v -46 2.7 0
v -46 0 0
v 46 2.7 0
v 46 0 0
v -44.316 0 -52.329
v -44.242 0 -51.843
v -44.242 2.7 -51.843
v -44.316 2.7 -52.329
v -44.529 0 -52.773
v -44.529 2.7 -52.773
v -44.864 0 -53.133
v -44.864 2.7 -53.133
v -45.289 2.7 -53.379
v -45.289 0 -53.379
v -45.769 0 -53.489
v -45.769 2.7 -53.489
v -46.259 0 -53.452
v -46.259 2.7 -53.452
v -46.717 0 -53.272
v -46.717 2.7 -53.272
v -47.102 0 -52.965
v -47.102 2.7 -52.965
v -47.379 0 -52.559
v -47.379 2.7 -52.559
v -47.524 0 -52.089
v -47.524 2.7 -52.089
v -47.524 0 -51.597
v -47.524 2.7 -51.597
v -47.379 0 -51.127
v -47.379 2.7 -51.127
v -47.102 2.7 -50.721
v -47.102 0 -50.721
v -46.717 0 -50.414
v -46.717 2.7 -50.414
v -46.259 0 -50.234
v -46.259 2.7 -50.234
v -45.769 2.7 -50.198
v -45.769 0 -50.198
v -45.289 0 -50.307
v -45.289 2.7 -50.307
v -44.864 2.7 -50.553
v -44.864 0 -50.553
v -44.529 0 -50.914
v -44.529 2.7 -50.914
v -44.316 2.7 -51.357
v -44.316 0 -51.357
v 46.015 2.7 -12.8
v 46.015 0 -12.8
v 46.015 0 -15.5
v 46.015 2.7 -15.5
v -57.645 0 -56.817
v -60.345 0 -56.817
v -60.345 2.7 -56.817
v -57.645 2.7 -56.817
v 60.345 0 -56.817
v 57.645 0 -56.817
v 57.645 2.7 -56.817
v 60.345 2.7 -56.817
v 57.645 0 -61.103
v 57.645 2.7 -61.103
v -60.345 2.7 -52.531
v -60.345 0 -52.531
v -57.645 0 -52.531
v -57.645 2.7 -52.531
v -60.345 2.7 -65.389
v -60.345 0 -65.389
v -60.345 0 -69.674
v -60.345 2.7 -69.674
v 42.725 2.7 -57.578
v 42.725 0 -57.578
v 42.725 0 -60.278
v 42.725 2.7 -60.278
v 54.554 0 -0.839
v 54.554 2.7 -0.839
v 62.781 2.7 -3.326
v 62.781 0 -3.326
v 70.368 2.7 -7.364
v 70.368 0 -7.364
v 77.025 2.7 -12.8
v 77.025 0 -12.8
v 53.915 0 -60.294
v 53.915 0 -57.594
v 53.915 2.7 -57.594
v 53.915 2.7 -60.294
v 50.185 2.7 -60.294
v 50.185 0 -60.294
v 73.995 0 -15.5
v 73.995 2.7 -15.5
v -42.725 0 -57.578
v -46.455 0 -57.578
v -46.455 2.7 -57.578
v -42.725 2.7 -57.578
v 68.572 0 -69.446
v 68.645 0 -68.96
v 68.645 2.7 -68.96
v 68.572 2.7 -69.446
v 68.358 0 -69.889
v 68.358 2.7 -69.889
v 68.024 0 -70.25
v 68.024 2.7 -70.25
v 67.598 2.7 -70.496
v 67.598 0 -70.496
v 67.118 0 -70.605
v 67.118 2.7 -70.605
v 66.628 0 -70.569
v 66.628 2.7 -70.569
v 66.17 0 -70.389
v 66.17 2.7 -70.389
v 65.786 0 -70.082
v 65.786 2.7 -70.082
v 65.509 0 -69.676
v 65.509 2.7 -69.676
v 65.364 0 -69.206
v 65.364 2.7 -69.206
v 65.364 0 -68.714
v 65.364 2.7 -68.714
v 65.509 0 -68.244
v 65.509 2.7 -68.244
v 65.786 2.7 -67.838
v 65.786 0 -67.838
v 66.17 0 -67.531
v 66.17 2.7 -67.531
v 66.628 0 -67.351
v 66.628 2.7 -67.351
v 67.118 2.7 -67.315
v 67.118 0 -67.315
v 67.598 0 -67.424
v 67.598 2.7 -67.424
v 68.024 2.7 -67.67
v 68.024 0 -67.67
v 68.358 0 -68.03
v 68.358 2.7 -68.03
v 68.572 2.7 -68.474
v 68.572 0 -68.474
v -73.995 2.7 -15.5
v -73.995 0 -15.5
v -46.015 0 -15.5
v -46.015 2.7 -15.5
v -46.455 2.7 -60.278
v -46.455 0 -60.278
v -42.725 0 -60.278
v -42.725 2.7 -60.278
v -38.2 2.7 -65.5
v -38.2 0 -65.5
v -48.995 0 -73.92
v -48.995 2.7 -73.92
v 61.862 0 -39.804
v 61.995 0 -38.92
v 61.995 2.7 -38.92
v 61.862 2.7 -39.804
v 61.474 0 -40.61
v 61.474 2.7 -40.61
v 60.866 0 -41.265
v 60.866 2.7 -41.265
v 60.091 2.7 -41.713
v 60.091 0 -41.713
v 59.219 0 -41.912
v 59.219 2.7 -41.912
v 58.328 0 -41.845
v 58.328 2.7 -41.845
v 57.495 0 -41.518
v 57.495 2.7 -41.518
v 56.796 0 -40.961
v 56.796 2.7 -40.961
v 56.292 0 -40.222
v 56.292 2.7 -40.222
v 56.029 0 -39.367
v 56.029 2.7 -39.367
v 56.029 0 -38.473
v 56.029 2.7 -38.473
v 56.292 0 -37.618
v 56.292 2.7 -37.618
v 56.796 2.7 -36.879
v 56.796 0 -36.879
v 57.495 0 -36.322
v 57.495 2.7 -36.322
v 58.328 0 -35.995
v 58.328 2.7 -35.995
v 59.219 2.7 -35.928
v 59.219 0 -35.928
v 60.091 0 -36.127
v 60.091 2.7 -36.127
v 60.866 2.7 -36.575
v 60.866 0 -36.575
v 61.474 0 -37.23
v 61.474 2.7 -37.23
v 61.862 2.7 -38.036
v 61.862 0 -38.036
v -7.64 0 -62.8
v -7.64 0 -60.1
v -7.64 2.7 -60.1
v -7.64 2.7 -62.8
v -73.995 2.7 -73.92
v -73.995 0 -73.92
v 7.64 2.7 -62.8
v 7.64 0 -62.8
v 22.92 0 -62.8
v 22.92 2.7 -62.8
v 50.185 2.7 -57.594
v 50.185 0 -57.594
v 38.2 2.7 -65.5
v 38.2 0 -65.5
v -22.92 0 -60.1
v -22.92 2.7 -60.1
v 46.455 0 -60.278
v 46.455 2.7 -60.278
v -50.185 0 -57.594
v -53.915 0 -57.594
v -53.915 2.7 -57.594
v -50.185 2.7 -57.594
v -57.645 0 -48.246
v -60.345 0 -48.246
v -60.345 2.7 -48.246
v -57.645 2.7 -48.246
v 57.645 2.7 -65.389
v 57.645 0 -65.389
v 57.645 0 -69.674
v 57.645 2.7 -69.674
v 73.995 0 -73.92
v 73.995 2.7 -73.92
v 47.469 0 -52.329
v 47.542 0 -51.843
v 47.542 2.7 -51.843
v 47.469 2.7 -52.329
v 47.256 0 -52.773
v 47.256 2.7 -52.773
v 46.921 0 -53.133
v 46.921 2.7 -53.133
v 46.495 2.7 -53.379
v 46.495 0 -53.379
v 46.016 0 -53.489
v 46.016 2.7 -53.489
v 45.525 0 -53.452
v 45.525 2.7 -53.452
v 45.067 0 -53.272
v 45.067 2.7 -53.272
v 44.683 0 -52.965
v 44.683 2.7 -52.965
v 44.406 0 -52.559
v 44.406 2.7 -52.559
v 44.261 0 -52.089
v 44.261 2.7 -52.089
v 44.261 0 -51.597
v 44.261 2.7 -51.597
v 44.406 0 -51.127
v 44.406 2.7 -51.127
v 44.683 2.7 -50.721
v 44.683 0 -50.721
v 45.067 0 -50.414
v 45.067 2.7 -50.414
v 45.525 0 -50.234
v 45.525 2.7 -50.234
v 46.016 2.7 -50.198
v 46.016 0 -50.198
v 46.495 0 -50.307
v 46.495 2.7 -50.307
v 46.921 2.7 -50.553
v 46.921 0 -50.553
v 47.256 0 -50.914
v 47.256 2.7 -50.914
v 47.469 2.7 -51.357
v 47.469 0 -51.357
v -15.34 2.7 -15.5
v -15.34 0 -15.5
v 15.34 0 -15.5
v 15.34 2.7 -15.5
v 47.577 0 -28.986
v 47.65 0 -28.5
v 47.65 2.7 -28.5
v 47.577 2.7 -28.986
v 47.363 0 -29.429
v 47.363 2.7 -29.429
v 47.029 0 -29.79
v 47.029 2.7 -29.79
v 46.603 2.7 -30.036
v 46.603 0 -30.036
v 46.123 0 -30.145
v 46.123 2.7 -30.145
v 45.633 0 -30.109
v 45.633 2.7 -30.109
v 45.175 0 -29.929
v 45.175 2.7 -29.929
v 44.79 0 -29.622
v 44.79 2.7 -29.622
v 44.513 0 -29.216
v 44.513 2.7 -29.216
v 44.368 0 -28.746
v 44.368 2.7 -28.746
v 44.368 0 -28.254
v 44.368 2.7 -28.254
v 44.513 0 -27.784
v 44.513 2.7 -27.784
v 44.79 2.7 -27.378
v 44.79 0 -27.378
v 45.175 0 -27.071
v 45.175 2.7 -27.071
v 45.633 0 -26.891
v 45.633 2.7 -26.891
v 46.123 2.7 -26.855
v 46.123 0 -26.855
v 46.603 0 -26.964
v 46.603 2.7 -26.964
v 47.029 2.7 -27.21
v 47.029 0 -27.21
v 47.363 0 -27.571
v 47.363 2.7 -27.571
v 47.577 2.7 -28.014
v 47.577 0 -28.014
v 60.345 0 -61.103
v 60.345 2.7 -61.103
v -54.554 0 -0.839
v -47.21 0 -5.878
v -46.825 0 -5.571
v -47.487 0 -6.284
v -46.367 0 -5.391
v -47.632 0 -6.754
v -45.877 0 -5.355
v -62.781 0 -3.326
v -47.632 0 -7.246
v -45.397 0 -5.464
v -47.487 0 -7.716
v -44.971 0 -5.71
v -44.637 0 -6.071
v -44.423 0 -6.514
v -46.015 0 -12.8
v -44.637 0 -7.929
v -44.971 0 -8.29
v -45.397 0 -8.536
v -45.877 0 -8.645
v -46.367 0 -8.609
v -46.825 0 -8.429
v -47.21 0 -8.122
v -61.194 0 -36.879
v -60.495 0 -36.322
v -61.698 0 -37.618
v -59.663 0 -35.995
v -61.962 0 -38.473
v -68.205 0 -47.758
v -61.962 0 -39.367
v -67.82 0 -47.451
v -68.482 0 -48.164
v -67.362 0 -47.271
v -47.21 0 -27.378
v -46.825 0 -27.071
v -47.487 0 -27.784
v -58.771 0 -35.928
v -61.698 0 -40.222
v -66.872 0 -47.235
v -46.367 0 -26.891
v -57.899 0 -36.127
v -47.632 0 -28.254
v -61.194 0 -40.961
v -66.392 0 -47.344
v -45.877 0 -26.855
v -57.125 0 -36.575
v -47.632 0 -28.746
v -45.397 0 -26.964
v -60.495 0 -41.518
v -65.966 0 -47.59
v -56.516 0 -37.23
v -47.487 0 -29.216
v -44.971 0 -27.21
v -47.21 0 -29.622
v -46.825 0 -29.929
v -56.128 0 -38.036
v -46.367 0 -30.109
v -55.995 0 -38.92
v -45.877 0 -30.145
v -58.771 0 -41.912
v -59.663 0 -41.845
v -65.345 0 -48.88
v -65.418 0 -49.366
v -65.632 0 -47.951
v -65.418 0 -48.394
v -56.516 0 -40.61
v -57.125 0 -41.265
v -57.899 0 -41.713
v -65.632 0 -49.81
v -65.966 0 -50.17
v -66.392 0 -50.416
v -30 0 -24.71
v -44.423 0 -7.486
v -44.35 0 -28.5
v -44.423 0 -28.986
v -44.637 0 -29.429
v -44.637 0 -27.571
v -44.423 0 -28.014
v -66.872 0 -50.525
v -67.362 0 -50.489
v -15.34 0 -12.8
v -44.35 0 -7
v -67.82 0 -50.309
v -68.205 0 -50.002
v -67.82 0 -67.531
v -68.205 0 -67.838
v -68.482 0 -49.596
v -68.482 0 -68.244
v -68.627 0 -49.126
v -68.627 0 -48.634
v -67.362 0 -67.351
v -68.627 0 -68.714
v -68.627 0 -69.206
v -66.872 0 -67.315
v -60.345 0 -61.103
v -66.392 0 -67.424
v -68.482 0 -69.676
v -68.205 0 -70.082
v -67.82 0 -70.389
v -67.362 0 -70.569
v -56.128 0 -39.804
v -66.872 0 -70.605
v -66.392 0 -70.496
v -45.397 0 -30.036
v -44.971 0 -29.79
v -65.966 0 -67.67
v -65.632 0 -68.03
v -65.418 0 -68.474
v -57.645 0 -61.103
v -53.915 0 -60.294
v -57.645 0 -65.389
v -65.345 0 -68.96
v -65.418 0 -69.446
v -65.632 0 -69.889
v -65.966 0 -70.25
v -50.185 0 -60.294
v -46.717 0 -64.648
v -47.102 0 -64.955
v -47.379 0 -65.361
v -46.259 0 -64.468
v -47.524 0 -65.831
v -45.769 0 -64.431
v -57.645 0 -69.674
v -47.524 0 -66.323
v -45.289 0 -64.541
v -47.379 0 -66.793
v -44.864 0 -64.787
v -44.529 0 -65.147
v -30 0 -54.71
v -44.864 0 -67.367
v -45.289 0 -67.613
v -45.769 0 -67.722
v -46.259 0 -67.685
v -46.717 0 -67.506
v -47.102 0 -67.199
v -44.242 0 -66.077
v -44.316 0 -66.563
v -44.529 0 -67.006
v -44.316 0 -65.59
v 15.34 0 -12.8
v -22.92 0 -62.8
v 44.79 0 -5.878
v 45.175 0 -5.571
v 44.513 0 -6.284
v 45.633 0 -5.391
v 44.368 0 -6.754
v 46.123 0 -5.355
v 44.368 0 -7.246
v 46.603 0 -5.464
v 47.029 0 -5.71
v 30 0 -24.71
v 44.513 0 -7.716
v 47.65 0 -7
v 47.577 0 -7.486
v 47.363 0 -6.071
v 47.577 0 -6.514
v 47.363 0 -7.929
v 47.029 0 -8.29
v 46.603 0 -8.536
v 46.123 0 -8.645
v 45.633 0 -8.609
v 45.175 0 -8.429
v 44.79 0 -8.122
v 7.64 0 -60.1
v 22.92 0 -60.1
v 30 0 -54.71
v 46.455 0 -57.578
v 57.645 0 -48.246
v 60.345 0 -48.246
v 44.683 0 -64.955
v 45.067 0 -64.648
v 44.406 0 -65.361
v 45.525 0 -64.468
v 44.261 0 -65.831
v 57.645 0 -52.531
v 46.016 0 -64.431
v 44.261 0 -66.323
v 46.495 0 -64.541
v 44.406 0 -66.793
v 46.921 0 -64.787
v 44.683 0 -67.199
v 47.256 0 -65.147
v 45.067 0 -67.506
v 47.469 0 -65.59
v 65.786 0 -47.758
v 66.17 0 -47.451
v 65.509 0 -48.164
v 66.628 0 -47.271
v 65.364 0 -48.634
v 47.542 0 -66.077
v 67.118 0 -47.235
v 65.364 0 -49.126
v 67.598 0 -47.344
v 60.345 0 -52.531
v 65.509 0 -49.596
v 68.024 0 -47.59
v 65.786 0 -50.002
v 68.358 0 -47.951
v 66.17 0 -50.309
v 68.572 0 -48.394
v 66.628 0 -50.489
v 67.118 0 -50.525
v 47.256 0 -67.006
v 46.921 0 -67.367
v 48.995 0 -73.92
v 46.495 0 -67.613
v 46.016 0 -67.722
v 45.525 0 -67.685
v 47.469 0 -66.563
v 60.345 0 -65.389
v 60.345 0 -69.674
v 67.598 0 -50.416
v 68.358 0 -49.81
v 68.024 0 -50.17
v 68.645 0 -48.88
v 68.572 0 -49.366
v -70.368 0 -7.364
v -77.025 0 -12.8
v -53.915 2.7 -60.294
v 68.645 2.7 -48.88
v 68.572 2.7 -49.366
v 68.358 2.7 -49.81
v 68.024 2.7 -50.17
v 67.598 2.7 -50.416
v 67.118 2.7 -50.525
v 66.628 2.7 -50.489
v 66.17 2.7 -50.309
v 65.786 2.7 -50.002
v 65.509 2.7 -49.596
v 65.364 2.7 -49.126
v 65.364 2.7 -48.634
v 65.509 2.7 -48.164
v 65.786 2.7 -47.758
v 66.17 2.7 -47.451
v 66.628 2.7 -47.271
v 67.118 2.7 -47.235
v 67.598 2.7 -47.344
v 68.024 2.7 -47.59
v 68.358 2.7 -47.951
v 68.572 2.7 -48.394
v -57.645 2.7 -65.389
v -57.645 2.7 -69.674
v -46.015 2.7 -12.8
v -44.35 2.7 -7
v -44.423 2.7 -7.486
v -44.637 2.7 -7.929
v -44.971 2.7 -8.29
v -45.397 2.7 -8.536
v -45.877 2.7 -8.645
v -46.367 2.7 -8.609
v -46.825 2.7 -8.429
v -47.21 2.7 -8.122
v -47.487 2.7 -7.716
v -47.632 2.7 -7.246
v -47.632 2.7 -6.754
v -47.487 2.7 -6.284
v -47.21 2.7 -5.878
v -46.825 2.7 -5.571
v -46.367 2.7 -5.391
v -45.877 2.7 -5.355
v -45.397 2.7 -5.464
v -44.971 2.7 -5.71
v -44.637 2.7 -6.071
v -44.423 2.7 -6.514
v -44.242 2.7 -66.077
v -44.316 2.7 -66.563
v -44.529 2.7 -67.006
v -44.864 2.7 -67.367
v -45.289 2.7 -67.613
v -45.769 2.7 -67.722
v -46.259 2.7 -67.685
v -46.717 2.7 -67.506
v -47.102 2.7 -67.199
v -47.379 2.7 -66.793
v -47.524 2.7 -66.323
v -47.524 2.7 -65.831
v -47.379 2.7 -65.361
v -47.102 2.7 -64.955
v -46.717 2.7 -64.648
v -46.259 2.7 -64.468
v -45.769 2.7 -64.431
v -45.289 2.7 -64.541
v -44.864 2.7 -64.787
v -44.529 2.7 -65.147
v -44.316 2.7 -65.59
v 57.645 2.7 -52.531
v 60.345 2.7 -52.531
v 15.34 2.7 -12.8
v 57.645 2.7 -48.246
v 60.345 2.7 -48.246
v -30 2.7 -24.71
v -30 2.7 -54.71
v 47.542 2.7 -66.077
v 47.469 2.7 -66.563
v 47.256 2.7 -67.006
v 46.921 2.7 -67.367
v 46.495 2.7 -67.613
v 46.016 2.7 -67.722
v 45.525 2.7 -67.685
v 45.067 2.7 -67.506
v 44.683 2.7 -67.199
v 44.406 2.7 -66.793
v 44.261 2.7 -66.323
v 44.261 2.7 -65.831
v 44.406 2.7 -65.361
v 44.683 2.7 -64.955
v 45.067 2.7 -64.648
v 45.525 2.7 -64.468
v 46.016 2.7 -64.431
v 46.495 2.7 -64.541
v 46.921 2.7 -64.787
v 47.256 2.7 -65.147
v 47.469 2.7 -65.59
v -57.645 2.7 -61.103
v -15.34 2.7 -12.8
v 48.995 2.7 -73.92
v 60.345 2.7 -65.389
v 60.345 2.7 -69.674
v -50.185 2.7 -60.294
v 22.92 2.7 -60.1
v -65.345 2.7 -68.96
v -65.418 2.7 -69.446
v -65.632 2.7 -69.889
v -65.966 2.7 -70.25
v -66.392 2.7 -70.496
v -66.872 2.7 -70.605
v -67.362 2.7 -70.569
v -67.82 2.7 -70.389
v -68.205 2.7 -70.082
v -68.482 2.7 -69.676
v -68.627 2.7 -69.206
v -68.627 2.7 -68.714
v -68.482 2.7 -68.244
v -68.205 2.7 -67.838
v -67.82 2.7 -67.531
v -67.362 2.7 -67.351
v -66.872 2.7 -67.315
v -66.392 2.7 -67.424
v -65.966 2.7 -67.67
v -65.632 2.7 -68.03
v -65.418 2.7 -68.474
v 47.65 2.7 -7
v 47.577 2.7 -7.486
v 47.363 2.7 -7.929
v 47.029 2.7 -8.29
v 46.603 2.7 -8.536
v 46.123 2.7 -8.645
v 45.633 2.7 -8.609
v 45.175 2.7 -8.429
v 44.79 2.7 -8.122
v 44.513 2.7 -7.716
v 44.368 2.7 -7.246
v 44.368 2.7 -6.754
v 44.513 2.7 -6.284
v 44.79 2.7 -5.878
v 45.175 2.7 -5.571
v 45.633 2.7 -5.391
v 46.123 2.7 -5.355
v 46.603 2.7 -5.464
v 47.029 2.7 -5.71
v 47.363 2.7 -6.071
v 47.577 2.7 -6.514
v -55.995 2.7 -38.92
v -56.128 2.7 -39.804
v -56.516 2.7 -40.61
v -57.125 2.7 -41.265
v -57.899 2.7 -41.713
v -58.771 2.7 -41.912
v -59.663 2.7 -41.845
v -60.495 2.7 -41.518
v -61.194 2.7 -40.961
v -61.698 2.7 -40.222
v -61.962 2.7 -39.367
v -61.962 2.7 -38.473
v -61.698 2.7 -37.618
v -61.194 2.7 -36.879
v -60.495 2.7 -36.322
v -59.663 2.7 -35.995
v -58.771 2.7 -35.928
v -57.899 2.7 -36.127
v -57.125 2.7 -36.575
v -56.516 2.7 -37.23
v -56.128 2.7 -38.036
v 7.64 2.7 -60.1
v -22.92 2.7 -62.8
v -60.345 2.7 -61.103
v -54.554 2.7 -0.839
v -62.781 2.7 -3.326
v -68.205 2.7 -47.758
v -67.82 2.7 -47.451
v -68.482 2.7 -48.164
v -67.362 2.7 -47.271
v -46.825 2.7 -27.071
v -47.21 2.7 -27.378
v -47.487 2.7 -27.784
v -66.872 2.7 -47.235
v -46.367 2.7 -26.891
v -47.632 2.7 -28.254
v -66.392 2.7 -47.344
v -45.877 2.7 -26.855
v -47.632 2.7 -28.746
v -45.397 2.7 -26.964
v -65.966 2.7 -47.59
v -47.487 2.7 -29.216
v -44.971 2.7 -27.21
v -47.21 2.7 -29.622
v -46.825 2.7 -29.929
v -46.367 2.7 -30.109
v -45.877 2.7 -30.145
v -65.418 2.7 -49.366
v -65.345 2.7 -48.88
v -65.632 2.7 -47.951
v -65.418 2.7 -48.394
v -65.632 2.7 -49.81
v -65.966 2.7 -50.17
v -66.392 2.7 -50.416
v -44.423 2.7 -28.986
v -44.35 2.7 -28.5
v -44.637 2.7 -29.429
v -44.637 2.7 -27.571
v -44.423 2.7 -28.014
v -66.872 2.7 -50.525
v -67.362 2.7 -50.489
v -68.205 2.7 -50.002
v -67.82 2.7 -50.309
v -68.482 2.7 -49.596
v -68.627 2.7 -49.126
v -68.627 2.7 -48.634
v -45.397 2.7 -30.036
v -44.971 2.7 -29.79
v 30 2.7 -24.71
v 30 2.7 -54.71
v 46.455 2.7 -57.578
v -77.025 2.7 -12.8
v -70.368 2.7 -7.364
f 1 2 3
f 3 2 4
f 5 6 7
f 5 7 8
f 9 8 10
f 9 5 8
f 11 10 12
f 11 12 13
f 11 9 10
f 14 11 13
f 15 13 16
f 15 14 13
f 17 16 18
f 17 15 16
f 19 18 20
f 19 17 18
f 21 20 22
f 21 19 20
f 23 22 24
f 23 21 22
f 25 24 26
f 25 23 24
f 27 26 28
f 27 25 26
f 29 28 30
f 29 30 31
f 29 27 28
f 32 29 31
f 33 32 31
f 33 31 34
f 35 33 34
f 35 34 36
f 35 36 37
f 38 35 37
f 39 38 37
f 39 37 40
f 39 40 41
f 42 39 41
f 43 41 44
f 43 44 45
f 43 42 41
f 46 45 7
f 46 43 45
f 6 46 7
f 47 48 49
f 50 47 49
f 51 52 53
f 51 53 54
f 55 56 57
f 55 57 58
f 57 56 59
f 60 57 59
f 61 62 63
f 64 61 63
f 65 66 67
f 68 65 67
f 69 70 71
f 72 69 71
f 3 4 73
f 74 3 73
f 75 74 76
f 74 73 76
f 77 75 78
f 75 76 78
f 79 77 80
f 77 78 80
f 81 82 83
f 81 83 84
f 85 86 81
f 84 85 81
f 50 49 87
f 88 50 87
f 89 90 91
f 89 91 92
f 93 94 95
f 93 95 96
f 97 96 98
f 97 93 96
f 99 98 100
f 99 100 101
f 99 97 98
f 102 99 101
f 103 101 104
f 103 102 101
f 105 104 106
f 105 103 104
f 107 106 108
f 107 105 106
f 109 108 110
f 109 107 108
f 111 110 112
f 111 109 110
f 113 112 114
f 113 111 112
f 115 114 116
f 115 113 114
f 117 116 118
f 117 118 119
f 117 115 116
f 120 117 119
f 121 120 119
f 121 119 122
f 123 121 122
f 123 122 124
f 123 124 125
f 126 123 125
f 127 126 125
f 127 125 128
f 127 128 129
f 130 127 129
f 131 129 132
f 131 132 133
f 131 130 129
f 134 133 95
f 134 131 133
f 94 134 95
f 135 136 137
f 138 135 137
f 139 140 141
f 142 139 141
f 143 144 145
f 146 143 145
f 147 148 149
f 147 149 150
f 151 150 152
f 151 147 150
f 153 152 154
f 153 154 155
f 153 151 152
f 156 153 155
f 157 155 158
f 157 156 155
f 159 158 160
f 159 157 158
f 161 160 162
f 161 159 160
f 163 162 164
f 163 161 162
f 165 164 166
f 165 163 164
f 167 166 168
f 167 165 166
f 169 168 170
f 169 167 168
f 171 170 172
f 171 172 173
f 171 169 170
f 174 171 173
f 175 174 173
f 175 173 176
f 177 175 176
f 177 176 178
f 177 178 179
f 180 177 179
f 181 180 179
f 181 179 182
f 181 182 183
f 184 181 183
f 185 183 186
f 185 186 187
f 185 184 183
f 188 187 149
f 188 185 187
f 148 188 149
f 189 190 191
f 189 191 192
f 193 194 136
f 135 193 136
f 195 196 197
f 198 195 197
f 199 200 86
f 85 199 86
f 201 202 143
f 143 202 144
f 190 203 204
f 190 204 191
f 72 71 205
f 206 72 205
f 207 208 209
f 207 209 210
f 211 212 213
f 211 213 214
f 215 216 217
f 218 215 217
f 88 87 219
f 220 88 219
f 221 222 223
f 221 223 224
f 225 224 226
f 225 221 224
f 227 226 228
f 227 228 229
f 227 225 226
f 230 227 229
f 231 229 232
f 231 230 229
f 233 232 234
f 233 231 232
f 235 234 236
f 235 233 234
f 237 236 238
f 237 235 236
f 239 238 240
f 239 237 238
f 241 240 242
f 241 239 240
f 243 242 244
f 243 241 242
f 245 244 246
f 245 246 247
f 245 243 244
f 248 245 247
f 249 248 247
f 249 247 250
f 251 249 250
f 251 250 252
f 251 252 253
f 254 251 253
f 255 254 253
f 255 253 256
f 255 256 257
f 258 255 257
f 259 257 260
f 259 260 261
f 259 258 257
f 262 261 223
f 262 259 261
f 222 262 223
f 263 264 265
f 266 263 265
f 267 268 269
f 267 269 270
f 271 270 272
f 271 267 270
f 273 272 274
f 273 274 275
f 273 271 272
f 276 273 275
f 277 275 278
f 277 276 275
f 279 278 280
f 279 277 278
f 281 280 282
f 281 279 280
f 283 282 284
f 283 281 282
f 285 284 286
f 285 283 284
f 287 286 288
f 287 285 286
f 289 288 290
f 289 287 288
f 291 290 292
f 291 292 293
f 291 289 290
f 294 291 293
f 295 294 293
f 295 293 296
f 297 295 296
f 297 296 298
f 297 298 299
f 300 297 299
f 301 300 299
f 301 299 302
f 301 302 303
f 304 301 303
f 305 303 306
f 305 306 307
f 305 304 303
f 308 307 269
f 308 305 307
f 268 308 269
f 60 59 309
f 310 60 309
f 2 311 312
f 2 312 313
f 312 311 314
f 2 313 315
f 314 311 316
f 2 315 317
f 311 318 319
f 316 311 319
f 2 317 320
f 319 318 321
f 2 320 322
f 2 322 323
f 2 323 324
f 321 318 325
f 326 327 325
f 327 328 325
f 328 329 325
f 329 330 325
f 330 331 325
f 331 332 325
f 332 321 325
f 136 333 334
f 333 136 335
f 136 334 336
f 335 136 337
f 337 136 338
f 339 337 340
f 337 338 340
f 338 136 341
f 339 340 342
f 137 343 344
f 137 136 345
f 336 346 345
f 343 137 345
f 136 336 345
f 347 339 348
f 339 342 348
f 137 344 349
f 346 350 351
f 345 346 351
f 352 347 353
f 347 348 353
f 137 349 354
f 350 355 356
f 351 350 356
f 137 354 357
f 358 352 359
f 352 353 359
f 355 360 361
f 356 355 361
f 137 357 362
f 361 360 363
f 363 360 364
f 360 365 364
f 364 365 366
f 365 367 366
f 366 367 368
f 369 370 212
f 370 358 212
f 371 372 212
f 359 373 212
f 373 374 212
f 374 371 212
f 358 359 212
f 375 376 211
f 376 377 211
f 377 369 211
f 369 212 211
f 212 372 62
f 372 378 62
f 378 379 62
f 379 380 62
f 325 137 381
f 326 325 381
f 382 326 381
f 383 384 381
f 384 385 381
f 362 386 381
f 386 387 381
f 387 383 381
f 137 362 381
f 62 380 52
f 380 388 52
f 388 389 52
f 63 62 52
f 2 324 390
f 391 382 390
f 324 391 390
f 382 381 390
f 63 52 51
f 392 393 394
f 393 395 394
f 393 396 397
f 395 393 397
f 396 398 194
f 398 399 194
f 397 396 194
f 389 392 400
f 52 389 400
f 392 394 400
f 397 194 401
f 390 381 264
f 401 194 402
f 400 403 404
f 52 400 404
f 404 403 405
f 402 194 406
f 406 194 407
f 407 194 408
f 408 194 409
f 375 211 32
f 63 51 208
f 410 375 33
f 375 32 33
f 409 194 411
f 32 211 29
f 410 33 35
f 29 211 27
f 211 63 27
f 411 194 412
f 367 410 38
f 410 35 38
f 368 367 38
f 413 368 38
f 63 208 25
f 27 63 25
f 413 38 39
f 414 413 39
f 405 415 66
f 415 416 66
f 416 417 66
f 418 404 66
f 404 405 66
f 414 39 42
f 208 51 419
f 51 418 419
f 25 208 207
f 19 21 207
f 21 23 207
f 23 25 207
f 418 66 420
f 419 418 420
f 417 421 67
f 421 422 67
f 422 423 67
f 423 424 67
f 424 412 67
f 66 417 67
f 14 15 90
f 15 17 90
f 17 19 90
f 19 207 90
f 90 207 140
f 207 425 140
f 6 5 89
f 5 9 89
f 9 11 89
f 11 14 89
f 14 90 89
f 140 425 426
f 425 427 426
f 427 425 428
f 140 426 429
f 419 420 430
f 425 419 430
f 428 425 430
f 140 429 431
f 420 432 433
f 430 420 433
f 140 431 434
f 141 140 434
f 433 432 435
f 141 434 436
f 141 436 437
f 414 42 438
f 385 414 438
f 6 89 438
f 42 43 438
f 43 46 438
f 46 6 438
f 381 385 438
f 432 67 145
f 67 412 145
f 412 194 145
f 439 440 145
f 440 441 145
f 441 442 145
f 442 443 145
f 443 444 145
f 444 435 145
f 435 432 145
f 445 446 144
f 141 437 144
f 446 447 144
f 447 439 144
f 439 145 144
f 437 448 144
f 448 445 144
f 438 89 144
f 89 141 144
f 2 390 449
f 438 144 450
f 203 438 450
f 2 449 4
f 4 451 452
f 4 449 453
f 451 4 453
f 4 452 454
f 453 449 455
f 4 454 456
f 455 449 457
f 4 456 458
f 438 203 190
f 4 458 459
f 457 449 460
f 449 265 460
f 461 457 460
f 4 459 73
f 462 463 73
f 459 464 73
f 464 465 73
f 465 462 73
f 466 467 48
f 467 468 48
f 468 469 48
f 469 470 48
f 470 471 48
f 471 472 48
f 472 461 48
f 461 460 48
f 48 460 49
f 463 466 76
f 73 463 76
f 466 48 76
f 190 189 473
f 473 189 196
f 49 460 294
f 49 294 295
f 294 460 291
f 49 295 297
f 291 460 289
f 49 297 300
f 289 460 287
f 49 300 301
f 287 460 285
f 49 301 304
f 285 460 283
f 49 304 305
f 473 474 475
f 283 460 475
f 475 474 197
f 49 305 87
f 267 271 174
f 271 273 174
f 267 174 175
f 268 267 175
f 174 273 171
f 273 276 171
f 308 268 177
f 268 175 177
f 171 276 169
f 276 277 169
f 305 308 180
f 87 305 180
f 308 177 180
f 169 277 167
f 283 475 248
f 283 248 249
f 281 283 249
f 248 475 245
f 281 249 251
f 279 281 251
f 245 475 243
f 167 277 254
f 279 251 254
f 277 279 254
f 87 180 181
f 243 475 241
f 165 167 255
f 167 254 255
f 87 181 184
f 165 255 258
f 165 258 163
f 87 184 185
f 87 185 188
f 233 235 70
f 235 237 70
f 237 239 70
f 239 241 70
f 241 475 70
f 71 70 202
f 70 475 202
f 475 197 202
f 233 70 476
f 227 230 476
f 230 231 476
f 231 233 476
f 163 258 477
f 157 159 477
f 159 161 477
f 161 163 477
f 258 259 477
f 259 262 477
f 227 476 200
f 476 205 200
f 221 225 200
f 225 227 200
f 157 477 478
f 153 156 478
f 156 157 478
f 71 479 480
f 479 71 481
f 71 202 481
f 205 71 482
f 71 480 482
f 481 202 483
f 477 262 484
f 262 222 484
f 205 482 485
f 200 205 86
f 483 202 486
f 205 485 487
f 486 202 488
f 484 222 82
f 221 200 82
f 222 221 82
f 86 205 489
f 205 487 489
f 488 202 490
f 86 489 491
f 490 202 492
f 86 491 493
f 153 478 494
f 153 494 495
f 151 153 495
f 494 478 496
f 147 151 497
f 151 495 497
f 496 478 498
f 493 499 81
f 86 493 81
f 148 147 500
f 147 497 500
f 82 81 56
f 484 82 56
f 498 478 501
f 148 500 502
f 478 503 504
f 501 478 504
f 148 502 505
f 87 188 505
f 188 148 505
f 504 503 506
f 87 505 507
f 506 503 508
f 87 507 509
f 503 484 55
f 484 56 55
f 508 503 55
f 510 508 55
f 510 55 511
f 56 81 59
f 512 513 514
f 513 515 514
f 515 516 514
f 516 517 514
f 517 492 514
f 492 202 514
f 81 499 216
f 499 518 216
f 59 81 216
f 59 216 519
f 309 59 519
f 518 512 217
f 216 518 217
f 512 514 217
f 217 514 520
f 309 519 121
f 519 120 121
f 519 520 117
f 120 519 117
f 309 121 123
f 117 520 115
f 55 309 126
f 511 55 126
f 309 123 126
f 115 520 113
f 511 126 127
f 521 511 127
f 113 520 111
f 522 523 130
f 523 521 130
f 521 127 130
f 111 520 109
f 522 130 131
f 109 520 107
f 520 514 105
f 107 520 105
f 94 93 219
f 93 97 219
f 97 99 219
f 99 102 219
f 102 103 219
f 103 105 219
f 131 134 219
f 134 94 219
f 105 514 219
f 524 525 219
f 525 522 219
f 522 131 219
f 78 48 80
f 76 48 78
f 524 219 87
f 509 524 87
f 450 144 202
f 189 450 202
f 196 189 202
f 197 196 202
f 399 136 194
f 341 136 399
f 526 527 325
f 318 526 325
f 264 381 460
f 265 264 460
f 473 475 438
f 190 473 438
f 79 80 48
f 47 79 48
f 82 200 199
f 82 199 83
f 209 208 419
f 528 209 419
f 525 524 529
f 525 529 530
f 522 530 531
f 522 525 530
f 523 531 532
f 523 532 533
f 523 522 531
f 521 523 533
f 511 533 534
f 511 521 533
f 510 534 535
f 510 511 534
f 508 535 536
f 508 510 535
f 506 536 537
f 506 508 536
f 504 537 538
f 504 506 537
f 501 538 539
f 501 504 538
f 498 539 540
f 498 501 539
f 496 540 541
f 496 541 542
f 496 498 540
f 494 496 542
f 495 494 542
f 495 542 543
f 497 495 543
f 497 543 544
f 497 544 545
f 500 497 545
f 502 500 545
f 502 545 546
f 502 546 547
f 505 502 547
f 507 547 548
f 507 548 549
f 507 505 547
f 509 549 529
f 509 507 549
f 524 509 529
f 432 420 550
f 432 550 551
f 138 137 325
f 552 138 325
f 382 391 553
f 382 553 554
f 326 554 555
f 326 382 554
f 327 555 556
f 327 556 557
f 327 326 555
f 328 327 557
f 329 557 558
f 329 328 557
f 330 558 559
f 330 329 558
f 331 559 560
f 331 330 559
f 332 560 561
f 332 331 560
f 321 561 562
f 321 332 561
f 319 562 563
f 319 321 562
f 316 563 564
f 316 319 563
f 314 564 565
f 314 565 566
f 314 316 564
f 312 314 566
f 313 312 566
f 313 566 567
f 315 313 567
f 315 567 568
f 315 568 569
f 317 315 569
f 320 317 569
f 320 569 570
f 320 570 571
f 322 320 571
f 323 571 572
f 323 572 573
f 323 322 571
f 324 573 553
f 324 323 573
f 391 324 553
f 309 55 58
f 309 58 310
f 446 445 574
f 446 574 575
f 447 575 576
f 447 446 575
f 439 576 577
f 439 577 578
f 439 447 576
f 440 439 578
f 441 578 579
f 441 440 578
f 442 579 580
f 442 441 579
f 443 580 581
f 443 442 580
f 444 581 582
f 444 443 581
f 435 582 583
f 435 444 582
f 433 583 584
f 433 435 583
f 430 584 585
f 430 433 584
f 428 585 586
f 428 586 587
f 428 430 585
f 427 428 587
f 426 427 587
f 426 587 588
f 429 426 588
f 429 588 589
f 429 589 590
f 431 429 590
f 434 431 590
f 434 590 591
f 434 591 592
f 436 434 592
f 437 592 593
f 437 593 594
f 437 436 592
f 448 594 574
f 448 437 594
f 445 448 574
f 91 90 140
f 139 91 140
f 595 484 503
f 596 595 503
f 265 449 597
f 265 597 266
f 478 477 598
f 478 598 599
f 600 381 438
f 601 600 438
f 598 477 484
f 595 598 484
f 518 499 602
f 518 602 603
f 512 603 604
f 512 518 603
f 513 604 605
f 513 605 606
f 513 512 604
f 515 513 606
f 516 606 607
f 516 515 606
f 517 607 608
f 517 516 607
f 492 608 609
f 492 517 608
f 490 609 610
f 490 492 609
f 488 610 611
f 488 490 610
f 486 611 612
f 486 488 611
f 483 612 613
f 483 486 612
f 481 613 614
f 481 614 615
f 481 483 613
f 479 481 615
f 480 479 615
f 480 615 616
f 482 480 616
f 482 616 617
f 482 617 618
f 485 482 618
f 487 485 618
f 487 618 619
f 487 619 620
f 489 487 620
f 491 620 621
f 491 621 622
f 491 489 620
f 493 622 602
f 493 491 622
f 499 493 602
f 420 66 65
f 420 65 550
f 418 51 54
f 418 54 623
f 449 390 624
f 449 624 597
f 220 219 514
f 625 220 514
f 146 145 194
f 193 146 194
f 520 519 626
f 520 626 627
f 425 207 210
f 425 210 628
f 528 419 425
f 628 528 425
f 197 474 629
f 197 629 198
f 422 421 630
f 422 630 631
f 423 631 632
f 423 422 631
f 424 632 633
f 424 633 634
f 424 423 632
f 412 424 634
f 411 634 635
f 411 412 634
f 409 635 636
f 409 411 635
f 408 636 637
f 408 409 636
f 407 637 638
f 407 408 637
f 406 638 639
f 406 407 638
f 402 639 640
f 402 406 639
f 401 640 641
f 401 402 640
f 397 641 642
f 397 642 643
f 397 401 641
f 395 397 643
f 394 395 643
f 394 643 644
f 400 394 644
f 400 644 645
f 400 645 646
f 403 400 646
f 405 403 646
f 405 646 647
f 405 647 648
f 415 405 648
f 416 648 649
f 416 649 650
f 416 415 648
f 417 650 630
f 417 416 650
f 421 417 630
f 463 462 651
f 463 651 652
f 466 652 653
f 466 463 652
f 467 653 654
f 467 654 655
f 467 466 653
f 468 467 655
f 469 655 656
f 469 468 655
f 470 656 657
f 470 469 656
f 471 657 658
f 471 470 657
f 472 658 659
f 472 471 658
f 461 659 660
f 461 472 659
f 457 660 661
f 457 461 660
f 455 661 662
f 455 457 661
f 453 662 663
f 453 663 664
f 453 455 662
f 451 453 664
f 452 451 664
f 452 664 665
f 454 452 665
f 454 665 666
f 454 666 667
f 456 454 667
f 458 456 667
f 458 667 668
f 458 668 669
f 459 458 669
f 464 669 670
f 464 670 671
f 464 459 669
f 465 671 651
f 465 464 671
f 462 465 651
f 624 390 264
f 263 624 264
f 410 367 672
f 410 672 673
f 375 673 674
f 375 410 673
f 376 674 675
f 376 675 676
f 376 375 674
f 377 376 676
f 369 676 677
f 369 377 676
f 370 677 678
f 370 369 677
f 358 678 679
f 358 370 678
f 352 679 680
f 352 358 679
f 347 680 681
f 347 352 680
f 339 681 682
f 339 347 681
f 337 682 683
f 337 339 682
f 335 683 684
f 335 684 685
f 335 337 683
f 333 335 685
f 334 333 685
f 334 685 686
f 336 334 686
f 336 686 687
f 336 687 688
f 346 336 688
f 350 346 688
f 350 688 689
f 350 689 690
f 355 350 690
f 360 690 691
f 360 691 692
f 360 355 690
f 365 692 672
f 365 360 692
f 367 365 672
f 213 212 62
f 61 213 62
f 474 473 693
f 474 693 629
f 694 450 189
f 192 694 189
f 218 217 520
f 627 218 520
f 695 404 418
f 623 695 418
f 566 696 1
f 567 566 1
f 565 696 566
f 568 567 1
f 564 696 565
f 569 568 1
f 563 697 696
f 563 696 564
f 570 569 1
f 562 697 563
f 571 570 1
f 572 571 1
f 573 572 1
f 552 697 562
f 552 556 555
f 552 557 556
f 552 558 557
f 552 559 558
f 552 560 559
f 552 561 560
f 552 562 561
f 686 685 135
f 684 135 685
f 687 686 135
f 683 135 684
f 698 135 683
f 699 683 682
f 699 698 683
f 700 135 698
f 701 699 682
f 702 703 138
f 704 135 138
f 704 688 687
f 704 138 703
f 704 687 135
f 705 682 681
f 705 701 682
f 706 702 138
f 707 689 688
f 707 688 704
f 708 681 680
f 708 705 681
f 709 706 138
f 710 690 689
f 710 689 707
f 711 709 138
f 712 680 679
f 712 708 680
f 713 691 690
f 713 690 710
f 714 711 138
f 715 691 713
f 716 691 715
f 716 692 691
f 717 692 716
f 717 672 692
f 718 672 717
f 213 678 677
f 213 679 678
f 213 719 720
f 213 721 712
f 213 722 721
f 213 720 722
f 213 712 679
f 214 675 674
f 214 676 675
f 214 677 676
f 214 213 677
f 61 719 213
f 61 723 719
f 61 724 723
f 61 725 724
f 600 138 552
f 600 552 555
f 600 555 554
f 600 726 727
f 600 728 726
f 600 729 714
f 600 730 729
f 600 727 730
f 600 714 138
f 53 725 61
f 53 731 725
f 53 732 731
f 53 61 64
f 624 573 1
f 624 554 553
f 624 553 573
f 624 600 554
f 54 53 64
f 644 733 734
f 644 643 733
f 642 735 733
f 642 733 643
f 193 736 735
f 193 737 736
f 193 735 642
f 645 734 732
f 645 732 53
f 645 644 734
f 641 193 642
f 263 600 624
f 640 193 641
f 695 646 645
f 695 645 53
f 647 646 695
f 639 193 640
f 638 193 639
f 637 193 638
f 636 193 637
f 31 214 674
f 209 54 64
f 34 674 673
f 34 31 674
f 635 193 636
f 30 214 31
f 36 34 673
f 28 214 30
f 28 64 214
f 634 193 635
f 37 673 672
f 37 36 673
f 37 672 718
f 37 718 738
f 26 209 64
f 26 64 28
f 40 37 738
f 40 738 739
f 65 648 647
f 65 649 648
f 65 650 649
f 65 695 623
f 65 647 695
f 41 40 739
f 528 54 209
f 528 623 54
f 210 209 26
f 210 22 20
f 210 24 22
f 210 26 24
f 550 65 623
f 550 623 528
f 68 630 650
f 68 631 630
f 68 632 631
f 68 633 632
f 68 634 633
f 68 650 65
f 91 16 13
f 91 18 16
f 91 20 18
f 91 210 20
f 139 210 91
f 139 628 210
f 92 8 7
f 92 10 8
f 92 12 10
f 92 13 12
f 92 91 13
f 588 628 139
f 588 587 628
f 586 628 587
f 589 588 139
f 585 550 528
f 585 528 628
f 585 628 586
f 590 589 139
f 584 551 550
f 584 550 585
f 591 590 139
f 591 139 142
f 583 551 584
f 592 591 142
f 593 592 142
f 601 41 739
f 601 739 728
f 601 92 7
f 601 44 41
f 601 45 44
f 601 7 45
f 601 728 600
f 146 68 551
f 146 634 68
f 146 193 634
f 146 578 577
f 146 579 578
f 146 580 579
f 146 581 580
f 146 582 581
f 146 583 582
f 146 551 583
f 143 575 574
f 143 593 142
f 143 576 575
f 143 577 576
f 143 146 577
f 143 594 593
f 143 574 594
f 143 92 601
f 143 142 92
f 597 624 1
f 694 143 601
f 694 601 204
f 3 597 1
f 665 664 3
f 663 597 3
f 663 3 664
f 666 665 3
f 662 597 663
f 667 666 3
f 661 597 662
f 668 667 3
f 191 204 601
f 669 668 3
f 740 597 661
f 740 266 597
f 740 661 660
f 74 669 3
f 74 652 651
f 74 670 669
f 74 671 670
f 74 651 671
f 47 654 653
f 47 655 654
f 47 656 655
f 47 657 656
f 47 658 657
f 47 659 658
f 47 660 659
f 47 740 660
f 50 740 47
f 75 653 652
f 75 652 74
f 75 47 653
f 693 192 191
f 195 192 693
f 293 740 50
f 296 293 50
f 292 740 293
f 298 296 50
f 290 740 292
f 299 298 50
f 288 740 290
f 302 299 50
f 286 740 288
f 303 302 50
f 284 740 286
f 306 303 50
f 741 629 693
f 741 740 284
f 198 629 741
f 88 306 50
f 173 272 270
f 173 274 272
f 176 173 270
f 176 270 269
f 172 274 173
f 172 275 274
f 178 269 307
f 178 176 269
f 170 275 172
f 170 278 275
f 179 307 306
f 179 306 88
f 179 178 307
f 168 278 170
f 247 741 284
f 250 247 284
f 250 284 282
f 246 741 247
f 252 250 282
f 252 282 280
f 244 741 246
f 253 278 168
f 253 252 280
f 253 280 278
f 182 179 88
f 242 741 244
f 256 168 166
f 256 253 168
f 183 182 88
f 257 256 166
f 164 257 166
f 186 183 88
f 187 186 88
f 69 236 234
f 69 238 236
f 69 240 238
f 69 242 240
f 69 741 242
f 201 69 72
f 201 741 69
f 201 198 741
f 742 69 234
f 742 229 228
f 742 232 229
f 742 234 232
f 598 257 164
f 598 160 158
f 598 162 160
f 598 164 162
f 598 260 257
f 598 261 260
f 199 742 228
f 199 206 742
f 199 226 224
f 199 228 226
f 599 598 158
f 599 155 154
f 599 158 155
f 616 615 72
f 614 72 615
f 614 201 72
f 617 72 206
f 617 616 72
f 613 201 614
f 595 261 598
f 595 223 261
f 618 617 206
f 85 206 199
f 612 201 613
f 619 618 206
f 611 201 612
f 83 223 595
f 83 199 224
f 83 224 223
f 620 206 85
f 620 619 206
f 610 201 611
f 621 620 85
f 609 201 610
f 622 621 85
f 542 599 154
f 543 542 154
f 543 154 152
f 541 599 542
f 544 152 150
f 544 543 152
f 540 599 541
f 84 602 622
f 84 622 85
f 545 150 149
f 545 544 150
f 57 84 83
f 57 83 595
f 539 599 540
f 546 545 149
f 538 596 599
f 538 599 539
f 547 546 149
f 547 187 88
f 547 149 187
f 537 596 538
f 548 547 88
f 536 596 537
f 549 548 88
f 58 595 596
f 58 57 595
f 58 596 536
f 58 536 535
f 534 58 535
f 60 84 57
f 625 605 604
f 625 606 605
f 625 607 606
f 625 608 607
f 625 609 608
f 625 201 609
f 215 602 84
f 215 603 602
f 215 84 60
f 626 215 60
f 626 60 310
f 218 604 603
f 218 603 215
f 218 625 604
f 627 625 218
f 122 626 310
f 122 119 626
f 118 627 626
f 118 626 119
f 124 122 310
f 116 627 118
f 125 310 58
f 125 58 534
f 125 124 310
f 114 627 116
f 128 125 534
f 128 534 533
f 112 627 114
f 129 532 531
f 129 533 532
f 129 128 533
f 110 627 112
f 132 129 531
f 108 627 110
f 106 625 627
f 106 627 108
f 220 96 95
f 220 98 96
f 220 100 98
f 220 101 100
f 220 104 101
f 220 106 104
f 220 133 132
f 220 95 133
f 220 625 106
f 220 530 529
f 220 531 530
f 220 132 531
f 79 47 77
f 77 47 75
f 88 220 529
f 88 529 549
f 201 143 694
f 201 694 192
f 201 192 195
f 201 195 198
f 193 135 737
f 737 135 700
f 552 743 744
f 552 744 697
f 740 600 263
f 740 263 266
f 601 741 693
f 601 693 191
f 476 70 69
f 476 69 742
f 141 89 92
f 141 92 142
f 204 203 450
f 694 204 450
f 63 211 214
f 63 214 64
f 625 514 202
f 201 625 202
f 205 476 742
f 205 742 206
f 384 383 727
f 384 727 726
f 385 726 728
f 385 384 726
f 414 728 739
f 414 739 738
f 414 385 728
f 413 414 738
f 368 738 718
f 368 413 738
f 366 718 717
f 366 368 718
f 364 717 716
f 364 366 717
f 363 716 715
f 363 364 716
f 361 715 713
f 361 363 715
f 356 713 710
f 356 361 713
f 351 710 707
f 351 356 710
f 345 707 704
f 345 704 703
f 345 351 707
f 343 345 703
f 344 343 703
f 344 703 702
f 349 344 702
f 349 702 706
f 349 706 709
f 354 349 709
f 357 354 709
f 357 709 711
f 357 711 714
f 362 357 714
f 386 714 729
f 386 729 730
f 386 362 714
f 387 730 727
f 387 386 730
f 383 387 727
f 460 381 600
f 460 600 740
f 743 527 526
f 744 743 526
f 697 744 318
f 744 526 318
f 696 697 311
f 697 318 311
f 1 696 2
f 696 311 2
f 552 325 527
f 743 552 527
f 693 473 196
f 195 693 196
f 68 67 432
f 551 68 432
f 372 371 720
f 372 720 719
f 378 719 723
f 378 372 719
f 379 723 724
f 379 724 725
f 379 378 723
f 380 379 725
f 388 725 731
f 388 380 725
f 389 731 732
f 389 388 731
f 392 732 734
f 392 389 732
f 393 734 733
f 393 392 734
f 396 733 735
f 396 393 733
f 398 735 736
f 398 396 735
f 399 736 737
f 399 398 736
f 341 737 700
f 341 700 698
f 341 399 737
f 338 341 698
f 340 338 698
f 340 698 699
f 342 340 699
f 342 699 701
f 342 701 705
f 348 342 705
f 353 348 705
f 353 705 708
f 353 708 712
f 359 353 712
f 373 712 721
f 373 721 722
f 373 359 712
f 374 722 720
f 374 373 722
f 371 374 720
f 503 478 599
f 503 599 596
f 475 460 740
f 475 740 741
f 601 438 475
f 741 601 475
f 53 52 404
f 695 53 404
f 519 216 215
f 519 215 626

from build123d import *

# Parameters (mm, degrees)
SKETCH1_R           = 1.65
SKETCH1_R_2         = 3
SKETCH1_W           = 30.68
SKETCH1_H           = 2.7
SKETCH1_W_2         = 15.28
SKETCH1_W_3         = 2.7
SKETCH1_H_2         = 4.285714286
SKETCH1_W_4         = 3.73
SKETCH1_W_5         = 60
SKETCH1_H_3         = 30
BOSS_EXTRUDE1_DEPTH = 2.7


with BuildPart() as part:
    # Sketch1 → Boss-Extrude1 (new body)
    with BuildSketch(Plane(origin=(0, 0, 0), x_dir=(1, 0, 0), z_dir=(0, 1, 0))):
        with BuildLine():
            Line((-46, 0), (46, 0))
            ThreePointArc((46, 0), (62.780941571, 3.32568378), (77.025151087, 12.8))
            Line((77.025151087, 12.8), (46.015151087, 12.8))
            Line((46.015151087, 12.8), (46.015151087, 15.5))
            Line((46.015151087, 15.5), (73.995151087, 15.5))
            Line((73.995151087, 15.5), (73.995151087, 35.5))
            Line((73.995151087, 35.5), (73.995151087, 43.92))
            Line((73.995151087, 43.92), (73.995151087, 73.92))
            Line((73.995151087, 73.92), (68.995151087, 73.92))
            Line((68.995151087, 73.92), (48.995151087, 73.92))
            Line((48.995151087, 73.92), (38.2, 65.5))
            Line((38.2, 65.5), (-38.2, 65.5))
            Line((-38.2, 65.5), (-48.995151087, 73.92))
            Line((-48.995151087, 73.92), (-68.995151087, 73.92))
            Line((-68.995151087, 73.92), (-73.995151087, 73.92))
            Line((-73.995151087, 73.92), (-73.995151087, 15.5))
            Line((-73.995151087, 15.5), (-46.015151087, 15.5))
            Line((-46.015151087, 15.5), (-46.015151087, 12.8))
            Line((-46.015151087, 12.8), (-77.025151087, 12.8))
            ThreePointArc((-77.025151087, 12.8), (-62.780941571, 3.32568378), (-46, 0))
        make_face()
        with Locations((46, 28.5)):
            Circle(SKETCH1_R, mode=Mode.SUBTRACT)
        with Locations((46, 7)):
            Circle(SKETCH1_R, mode=Mode.SUBTRACT)
        with Locations((-46, 7)):
            Circle(SKETCH1_R, mode=Mode.SUBTRACT)
        with Locations((-46, 28.5)):
            Circle(SKETCH1_R, mode=Mode.SUBTRACT)
        with Locations((66.995151087, 68.959972417)):
            Circle(SKETCH1_R, mode=Mode.SUBTRACT)
        with Locations((66.995151087, 48.880027583)):
            Circle(SKETCH1_R, mode=Mode.SUBTRACT)
        with Locations((45.892266276, 66.076819007)):
            Circle(SKETCH1_R, mode=Mode.SUBTRACT)
        with Locations((45.892266276, 51.843125828)):
            Circle(SKETCH1_R, mode=Mode.SUBTRACT)
        with Locations((-66.995151087, 48.880027583)):
            Circle(SKETCH1_R, mode=Mode.SUBTRACT)
        with Locations((-45.892266276, 66.076819007)):
            Circle(SKETCH1_R, mode=Mode.SUBTRACT)
        with Locations((-66.995151087, 68.959972417)):
            Circle(SKETCH1_R, mode=Mode.SUBTRACT)
        with Locations((-45.892266276, 51.843125828)):
            Circle(SKETCH1_R, mode=Mode.SUBTRACT)
        with Locations((-58.995151087, 38.92)):
            Circle(SKETCH1_R_2, mode=Mode.SUBTRACT)
        with Locations((58.995151087, 38.92)):
            Circle(SKETCH1_R_2, mode=Mode.SUBTRACT)
        with Locations((0, 14.15)):
            Rectangle(SKETCH1_W, SKETCH1_H, mode=Mode.SUBTRACT)
        with Locations((-15.28, 61.45)):
            Rectangle(SKETCH1_W_2, SKETCH1_H, mode=Mode.SUBTRACT)
        with Locations((15.28, 61.45)):
            Rectangle(SKETCH1_W_2, SKETCH1_H, mode=Mode.SUBTRACT)
        with Locations((58.995151087, 58.959972417)):
            Rectangle(SKETCH1_W_3, SKETCH1_H_2, mode=Mode.SUBTRACT)
        with Locations((44.590151087, 58.927994483)):
            Rectangle(SKETCH1_W_4, SKETCH1_H, mode=Mode.SUBTRACT)
        with Locations((58.995151087, 50.388543846)):
            Rectangle(SKETCH1_W_3, SKETCH1_H_2, mode=Mode.SUBTRACT)
        with Locations((58.995151087, 67.531400989)):
            Rectangle(SKETCH1_W_3, SKETCH1_H_2, mode=Mode.SUBTRACT)
        with Locations((52.050151087, 58.94398345)):
            Rectangle(SKETCH1_W_4, SKETCH1_H, mode=Mode.SUBTRACT)
        with Locations((-52.050151087, 58.94398345)):
            Rectangle(SKETCH1_W_4, SKETCH1_H, mode=Mode.SUBTRACT)
        with Locations((-44.590151087, 58.927994483)):
            Rectangle(SKETCH1_W_4, SKETCH1_H, mode=Mode.SUBTRACT)
        with Locations((-58.995151087, 67.531400989)):
            Rectangle(SKETCH1_W_3, SKETCH1_H_2, mode=Mode.SUBTRACT)
        with Locations((-58.995151087, 58.959972417)):
            Rectangle(SKETCH1_W_3, SKETCH1_H_2, mode=Mode.SUBTRACT)
        with Locations((-58.995151087, 50.388543846)):
            Rectangle(SKETCH1_W_3, SKETCH1_H_2, mode=Mode.SUBTRACT)
        with Locations((0, 39.71)):
            Rectangle(SKETCH1_W_5, SKETCH1_H_3, mode=Mode.SUBTRACT)
    extrude(amount=BOSS_EXTRUDE1_DEPTH)


solid = part.part
